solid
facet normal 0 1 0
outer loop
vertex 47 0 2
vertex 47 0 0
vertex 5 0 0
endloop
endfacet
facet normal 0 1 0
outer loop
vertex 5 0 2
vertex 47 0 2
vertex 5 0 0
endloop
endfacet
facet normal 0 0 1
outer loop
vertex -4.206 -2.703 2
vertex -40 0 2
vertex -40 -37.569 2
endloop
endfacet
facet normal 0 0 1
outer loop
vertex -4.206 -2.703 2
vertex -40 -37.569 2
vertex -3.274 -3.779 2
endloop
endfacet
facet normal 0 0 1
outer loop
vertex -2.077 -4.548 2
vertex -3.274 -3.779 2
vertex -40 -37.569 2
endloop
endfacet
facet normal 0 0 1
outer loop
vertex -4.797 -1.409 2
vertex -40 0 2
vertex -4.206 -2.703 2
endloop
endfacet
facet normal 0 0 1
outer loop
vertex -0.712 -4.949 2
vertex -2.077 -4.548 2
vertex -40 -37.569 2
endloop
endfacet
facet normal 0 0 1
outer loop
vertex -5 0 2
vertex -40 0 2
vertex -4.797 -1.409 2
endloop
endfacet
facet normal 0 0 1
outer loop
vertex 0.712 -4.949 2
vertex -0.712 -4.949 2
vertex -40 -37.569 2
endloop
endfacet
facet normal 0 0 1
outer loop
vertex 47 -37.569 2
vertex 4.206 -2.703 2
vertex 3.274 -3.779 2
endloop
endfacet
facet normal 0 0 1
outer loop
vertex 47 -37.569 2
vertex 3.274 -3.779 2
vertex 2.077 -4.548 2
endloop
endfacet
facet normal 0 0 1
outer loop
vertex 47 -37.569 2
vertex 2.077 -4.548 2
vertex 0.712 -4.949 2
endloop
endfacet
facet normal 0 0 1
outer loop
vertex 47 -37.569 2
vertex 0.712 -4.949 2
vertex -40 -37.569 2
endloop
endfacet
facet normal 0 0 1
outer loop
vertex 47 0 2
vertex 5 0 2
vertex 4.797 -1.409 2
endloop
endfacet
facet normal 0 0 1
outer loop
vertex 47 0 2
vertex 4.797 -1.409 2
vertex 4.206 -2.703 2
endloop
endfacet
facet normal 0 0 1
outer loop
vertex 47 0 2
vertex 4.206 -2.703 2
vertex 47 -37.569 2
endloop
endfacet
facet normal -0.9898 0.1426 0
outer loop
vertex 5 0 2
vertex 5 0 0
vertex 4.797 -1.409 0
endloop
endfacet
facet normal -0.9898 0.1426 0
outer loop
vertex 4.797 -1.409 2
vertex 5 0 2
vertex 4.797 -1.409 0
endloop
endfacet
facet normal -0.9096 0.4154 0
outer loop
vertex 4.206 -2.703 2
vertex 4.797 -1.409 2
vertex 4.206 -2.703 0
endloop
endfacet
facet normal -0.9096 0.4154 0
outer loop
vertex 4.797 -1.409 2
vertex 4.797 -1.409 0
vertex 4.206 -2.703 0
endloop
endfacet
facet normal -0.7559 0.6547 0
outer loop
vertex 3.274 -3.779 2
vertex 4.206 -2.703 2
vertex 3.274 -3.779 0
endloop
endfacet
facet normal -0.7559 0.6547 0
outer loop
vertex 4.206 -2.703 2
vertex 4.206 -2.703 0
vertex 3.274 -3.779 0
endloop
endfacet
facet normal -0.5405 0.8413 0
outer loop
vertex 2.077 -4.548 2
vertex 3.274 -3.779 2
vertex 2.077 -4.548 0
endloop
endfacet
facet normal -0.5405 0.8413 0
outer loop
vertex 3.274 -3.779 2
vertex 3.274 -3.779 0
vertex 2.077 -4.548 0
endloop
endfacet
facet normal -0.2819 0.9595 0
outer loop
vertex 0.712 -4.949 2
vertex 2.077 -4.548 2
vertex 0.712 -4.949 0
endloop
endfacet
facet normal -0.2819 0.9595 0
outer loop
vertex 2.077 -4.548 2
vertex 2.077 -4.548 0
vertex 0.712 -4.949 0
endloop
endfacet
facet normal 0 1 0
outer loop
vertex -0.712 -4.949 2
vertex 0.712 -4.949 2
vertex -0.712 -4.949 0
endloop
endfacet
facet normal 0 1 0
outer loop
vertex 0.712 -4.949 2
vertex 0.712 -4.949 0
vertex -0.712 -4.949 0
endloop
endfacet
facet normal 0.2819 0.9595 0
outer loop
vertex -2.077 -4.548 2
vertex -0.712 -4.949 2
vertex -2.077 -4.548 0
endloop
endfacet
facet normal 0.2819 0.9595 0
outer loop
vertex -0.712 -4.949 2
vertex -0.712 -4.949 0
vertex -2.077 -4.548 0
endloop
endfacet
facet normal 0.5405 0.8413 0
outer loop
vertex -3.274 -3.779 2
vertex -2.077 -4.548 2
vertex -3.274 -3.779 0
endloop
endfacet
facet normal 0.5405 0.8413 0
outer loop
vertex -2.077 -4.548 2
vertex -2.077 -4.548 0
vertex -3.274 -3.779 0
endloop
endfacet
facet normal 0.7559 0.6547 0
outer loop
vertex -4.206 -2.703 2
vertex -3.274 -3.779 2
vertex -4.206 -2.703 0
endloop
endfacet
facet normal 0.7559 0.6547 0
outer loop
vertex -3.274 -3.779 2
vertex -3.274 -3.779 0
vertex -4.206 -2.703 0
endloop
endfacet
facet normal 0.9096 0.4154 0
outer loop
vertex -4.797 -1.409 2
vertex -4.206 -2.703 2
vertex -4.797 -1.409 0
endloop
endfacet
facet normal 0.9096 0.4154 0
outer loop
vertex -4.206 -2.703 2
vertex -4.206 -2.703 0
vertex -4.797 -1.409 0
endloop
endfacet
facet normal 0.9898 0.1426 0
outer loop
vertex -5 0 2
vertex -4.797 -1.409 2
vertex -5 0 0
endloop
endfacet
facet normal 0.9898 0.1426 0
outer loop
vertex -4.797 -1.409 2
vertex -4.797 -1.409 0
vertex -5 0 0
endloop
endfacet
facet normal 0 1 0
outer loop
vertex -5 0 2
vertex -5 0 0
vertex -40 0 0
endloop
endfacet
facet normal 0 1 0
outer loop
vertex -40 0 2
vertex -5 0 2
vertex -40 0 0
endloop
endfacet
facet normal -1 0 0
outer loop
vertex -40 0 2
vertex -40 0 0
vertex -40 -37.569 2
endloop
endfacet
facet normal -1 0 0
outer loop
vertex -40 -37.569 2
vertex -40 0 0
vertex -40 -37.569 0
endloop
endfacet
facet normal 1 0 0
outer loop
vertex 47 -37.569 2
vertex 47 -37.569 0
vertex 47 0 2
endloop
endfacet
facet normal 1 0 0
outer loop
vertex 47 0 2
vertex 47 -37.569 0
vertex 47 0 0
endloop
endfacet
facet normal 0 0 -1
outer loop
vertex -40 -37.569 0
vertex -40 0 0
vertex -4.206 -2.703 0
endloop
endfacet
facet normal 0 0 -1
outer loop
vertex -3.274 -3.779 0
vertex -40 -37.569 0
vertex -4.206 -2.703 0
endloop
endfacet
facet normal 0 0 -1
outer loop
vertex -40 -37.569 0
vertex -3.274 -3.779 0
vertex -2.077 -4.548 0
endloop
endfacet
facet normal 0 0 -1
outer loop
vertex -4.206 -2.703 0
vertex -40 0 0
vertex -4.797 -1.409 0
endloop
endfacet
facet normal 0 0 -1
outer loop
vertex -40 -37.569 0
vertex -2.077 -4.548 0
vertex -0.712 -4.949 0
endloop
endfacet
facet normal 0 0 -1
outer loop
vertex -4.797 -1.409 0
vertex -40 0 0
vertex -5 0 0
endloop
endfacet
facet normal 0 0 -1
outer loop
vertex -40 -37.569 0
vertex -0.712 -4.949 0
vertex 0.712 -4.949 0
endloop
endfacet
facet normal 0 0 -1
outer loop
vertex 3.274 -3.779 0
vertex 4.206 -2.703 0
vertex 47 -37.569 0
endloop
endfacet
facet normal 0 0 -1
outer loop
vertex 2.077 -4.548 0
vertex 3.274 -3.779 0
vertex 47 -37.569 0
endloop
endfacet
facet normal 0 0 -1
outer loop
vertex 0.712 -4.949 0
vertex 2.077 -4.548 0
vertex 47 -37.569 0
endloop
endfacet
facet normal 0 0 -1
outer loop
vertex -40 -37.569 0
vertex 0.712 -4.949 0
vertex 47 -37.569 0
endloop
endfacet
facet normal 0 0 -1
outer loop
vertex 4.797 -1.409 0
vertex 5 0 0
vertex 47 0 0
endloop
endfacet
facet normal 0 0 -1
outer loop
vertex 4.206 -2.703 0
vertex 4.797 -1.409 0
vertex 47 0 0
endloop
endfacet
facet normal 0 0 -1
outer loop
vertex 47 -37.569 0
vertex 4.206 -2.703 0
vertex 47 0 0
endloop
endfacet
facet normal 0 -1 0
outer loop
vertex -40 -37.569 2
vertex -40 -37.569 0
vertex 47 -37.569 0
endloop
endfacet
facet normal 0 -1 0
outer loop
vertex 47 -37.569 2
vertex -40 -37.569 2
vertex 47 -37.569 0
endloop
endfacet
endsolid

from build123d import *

# Parameters (mm, degrees)
F1_DEPTH = 2


with BuildPart() as f1:
    # F0 (on Top) → F1 (new body)
    with BuildSketch(Plane.XY):
        with BuildLine():
            Line((35, 0), (5, 0))
            ThreePointArc((5, 0), (0, -5), (-5, 0))
            Line((-5, 0), (-35, 0))
            ThreePointArc((-35, 0), (0, -35), (35, 0))
        make_face()
        with BuildLine():
            Line((47, 0), (35, 0))
            ThreePointArc((35, 0), (0, -35), (-35, 0))
            Line((-35, 0), (-40, 0))
            Line((-40, 0), (-40, -37.5692024827))
            Line((-40, -37.5692024827), (47, -37.5692024827))
            Line((47, -37.5692024827), (47, 0))
        make_face()
    extrude(amount=F1_DEPTH)


solid = f1.part
